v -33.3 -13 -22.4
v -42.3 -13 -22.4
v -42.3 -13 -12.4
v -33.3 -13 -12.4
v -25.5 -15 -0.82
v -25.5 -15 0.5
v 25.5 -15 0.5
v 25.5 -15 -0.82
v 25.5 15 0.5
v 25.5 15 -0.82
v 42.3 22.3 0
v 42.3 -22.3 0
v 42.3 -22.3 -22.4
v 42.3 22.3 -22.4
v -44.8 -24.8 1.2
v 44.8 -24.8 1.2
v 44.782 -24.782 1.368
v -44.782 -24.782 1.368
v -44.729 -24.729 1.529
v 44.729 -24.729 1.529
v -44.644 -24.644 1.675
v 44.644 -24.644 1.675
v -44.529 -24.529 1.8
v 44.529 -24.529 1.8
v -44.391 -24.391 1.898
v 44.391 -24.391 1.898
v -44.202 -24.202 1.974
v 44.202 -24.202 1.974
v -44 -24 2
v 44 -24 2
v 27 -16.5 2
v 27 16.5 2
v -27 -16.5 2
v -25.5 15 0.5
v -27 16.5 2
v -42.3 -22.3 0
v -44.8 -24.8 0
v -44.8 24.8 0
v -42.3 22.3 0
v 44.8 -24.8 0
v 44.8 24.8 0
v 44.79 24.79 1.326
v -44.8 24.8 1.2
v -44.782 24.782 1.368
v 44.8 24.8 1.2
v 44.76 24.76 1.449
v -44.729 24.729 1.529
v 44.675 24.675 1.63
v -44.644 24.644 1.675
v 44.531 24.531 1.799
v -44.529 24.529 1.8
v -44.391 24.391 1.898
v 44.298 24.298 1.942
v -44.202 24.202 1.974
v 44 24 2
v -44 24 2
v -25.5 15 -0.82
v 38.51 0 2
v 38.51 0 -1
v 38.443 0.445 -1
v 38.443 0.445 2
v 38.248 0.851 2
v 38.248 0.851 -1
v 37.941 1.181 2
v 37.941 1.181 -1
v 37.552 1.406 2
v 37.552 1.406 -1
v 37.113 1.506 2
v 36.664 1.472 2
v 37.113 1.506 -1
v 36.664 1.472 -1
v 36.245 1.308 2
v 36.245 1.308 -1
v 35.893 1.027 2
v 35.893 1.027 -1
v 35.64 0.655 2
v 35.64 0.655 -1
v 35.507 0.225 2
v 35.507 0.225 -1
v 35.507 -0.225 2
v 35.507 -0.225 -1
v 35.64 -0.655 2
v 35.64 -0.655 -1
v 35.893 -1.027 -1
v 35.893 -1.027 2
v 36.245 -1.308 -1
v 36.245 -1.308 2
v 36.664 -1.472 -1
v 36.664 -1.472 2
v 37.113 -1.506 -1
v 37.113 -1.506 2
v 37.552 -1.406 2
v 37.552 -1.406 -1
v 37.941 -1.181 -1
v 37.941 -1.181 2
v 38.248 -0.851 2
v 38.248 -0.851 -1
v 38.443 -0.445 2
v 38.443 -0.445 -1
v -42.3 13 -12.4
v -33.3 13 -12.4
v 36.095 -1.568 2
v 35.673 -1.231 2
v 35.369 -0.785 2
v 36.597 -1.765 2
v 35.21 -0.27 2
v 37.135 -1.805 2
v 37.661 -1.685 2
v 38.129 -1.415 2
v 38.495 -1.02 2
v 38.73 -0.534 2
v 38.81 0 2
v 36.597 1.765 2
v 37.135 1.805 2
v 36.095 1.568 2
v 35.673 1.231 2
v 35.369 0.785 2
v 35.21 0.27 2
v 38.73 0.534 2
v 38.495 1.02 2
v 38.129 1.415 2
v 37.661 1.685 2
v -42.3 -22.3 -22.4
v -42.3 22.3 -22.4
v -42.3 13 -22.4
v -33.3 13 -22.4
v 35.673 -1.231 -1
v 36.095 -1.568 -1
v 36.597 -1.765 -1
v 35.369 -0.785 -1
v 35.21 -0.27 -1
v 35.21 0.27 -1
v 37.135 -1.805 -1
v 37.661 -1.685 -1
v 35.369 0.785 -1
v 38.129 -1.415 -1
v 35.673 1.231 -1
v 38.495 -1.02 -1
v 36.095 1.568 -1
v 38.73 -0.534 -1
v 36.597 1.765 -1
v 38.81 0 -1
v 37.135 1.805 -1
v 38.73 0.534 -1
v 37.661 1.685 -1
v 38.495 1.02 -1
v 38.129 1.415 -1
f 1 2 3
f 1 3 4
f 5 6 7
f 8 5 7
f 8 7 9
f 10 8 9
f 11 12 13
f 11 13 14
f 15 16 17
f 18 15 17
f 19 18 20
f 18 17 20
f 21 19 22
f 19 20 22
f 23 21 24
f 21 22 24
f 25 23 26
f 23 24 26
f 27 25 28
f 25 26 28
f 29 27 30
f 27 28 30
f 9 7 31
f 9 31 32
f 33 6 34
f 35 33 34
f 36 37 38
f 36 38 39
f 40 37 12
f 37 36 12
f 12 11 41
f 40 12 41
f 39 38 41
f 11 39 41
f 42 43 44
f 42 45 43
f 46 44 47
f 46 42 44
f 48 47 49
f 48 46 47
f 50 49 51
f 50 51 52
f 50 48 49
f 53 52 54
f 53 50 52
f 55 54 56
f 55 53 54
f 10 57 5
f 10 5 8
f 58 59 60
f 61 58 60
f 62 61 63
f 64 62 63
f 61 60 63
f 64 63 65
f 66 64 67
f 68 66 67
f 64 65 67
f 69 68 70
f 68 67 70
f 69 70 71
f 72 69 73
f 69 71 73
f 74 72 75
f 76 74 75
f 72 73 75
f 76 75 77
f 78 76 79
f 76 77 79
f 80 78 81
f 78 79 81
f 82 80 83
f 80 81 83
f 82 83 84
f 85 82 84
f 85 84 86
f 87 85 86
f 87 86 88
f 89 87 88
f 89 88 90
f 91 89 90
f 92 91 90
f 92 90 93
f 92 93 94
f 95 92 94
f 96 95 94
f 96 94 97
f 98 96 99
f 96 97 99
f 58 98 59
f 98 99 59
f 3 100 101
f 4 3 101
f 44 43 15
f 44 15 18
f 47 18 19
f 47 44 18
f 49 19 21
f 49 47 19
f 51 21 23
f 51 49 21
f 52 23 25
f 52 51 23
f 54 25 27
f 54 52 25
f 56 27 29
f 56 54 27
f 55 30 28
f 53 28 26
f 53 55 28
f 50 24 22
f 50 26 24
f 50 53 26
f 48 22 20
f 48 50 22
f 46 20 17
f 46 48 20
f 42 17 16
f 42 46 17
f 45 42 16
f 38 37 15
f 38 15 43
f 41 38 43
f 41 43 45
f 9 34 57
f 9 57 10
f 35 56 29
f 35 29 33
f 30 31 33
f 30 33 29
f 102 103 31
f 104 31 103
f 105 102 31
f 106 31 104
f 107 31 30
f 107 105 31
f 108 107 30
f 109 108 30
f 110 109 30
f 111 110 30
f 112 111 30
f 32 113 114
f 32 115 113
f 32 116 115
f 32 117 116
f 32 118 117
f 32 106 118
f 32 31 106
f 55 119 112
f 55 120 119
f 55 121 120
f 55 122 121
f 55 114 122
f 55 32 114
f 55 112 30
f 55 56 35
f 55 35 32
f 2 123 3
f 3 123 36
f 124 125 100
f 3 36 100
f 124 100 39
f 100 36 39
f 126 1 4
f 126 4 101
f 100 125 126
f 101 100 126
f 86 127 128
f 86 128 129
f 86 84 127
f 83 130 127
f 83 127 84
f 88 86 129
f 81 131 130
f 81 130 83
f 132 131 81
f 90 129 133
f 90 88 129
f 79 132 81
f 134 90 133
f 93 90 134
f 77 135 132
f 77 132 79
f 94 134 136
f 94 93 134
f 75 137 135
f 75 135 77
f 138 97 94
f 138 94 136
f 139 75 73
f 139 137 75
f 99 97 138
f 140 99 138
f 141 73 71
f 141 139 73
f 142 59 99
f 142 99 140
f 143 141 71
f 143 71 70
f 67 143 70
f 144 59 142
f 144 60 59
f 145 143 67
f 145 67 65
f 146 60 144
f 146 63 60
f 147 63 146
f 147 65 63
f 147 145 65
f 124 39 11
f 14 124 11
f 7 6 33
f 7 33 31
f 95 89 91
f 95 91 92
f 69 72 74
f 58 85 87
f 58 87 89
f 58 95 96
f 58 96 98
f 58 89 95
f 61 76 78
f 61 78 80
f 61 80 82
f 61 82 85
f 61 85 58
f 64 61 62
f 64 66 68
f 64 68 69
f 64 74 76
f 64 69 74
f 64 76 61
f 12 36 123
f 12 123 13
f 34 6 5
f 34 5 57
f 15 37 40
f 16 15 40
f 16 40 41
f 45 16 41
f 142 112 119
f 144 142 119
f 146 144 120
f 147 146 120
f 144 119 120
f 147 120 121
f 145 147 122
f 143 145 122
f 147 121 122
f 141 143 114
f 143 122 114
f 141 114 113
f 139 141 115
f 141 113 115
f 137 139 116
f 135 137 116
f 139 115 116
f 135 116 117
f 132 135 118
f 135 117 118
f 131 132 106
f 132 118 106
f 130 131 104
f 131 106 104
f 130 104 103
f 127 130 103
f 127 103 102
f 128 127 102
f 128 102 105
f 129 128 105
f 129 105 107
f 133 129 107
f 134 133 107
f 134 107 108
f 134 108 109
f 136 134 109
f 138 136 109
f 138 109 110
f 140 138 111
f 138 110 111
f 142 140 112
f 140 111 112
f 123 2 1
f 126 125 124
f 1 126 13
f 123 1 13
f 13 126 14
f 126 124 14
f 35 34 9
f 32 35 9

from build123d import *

# Parameters (mm, degrees)
SKETCH_W        = 84.6
SKETCH_H        = 44.6
PAD_DEPTH       = 22.4
SKETCH001_W     = 89.6
SKETCH001_H     = 49.6
PAD001_DEPTH    = 2
FILLET_R        = 0.8
SKETCH002_W     = 51
SKETCH002_H     = 30
POCKET_DEPTH    = 2.82
CHAMFER_SIZE    = 1.5
SKETCH003_R     = 1.81
POCKET001_DEPTH = 3
SKETCH006_W     = 9
SKETCH006_H     = 26
POCKET002_DEPTH = 10
SKETCH007_R     = 1.51
PAD002_DEPTH    = 3


with BuildPart() as part:
    # Sketch → Pad (new body)
    with BuildSketch(Plane.XY):
        Rectangle(SKETCH_W, SKETCH_H)
    extrude(amount=-PAD_DEPTH)

    # Sketch001 → Pad001 (join)
    with BuildSketch(Plane.XY):
        Rectangle(SKETCH001_W, SKETCH001_H)
    extrude(amount=PAD001_DEPTH)

    # Fillet
    fillet_edges = [part.edges().sort_by_distance(p)[0] for p in [
        (0, -24.8, 2),
        (44.8, 0, 2),
        (0, 24.8, 2),
        (-44.8, 0, 2),
    ]]
    fillet(fillet_edges, radius=FILLET_R)

    # Sketch002 (on Face8 of Fillet) → Pocket (cut)
    with BuildSketch(Plane.XY.offset(2)):
        Rectangle(SKETCH002_W, SKETCH002_H)
    extrude(amount=-POCKET_DEPTH, mode=Mode.SUBTRACT)

    # Chamfer
    chamfer_edges = [part.edges().sort_by_distance(p)[0] for p in [
        (-25.5, 0, 2),
        (0, 15, 2),
        (0, -15, 2),
        (25.5, 0, 2),
    ]]
    chamfer(chamfer_edges, length=CHAMFER_SIZE)

    # Sketch003 (on Face1 of Chamfer) → Pocket001 (cut)
    with BuildSketch(Plane.XY.offset(2)):
        with Locations((37, 0)):
            Circle(SKETCH003_R)
    extrude(amount=-POCKET001_DEPTH, mode=Mode.SUBTRACT)

    # Sketch006 (on DatumPlane) → Pocket002 (cut)
    with BuildSketch(Plane.XY.offset(-22.4)):
        with Locations((-37.8, 0)):
            Rectangle(SKETCH006_W, SKETCH006_H)
    extrude(amount=POCKET002_DEPTH, mode=Mode.SUBTRACT)

    # Sketch007 (on DatumPlane) → Pad002 (join)
    with BuildSketch(Plane.XY.offset(-1)):
        with Locations((37, 0)):
            Circle(SKETCH007_R)
    extrude(amount=PAD002_DEPTH)


solid = part.part
